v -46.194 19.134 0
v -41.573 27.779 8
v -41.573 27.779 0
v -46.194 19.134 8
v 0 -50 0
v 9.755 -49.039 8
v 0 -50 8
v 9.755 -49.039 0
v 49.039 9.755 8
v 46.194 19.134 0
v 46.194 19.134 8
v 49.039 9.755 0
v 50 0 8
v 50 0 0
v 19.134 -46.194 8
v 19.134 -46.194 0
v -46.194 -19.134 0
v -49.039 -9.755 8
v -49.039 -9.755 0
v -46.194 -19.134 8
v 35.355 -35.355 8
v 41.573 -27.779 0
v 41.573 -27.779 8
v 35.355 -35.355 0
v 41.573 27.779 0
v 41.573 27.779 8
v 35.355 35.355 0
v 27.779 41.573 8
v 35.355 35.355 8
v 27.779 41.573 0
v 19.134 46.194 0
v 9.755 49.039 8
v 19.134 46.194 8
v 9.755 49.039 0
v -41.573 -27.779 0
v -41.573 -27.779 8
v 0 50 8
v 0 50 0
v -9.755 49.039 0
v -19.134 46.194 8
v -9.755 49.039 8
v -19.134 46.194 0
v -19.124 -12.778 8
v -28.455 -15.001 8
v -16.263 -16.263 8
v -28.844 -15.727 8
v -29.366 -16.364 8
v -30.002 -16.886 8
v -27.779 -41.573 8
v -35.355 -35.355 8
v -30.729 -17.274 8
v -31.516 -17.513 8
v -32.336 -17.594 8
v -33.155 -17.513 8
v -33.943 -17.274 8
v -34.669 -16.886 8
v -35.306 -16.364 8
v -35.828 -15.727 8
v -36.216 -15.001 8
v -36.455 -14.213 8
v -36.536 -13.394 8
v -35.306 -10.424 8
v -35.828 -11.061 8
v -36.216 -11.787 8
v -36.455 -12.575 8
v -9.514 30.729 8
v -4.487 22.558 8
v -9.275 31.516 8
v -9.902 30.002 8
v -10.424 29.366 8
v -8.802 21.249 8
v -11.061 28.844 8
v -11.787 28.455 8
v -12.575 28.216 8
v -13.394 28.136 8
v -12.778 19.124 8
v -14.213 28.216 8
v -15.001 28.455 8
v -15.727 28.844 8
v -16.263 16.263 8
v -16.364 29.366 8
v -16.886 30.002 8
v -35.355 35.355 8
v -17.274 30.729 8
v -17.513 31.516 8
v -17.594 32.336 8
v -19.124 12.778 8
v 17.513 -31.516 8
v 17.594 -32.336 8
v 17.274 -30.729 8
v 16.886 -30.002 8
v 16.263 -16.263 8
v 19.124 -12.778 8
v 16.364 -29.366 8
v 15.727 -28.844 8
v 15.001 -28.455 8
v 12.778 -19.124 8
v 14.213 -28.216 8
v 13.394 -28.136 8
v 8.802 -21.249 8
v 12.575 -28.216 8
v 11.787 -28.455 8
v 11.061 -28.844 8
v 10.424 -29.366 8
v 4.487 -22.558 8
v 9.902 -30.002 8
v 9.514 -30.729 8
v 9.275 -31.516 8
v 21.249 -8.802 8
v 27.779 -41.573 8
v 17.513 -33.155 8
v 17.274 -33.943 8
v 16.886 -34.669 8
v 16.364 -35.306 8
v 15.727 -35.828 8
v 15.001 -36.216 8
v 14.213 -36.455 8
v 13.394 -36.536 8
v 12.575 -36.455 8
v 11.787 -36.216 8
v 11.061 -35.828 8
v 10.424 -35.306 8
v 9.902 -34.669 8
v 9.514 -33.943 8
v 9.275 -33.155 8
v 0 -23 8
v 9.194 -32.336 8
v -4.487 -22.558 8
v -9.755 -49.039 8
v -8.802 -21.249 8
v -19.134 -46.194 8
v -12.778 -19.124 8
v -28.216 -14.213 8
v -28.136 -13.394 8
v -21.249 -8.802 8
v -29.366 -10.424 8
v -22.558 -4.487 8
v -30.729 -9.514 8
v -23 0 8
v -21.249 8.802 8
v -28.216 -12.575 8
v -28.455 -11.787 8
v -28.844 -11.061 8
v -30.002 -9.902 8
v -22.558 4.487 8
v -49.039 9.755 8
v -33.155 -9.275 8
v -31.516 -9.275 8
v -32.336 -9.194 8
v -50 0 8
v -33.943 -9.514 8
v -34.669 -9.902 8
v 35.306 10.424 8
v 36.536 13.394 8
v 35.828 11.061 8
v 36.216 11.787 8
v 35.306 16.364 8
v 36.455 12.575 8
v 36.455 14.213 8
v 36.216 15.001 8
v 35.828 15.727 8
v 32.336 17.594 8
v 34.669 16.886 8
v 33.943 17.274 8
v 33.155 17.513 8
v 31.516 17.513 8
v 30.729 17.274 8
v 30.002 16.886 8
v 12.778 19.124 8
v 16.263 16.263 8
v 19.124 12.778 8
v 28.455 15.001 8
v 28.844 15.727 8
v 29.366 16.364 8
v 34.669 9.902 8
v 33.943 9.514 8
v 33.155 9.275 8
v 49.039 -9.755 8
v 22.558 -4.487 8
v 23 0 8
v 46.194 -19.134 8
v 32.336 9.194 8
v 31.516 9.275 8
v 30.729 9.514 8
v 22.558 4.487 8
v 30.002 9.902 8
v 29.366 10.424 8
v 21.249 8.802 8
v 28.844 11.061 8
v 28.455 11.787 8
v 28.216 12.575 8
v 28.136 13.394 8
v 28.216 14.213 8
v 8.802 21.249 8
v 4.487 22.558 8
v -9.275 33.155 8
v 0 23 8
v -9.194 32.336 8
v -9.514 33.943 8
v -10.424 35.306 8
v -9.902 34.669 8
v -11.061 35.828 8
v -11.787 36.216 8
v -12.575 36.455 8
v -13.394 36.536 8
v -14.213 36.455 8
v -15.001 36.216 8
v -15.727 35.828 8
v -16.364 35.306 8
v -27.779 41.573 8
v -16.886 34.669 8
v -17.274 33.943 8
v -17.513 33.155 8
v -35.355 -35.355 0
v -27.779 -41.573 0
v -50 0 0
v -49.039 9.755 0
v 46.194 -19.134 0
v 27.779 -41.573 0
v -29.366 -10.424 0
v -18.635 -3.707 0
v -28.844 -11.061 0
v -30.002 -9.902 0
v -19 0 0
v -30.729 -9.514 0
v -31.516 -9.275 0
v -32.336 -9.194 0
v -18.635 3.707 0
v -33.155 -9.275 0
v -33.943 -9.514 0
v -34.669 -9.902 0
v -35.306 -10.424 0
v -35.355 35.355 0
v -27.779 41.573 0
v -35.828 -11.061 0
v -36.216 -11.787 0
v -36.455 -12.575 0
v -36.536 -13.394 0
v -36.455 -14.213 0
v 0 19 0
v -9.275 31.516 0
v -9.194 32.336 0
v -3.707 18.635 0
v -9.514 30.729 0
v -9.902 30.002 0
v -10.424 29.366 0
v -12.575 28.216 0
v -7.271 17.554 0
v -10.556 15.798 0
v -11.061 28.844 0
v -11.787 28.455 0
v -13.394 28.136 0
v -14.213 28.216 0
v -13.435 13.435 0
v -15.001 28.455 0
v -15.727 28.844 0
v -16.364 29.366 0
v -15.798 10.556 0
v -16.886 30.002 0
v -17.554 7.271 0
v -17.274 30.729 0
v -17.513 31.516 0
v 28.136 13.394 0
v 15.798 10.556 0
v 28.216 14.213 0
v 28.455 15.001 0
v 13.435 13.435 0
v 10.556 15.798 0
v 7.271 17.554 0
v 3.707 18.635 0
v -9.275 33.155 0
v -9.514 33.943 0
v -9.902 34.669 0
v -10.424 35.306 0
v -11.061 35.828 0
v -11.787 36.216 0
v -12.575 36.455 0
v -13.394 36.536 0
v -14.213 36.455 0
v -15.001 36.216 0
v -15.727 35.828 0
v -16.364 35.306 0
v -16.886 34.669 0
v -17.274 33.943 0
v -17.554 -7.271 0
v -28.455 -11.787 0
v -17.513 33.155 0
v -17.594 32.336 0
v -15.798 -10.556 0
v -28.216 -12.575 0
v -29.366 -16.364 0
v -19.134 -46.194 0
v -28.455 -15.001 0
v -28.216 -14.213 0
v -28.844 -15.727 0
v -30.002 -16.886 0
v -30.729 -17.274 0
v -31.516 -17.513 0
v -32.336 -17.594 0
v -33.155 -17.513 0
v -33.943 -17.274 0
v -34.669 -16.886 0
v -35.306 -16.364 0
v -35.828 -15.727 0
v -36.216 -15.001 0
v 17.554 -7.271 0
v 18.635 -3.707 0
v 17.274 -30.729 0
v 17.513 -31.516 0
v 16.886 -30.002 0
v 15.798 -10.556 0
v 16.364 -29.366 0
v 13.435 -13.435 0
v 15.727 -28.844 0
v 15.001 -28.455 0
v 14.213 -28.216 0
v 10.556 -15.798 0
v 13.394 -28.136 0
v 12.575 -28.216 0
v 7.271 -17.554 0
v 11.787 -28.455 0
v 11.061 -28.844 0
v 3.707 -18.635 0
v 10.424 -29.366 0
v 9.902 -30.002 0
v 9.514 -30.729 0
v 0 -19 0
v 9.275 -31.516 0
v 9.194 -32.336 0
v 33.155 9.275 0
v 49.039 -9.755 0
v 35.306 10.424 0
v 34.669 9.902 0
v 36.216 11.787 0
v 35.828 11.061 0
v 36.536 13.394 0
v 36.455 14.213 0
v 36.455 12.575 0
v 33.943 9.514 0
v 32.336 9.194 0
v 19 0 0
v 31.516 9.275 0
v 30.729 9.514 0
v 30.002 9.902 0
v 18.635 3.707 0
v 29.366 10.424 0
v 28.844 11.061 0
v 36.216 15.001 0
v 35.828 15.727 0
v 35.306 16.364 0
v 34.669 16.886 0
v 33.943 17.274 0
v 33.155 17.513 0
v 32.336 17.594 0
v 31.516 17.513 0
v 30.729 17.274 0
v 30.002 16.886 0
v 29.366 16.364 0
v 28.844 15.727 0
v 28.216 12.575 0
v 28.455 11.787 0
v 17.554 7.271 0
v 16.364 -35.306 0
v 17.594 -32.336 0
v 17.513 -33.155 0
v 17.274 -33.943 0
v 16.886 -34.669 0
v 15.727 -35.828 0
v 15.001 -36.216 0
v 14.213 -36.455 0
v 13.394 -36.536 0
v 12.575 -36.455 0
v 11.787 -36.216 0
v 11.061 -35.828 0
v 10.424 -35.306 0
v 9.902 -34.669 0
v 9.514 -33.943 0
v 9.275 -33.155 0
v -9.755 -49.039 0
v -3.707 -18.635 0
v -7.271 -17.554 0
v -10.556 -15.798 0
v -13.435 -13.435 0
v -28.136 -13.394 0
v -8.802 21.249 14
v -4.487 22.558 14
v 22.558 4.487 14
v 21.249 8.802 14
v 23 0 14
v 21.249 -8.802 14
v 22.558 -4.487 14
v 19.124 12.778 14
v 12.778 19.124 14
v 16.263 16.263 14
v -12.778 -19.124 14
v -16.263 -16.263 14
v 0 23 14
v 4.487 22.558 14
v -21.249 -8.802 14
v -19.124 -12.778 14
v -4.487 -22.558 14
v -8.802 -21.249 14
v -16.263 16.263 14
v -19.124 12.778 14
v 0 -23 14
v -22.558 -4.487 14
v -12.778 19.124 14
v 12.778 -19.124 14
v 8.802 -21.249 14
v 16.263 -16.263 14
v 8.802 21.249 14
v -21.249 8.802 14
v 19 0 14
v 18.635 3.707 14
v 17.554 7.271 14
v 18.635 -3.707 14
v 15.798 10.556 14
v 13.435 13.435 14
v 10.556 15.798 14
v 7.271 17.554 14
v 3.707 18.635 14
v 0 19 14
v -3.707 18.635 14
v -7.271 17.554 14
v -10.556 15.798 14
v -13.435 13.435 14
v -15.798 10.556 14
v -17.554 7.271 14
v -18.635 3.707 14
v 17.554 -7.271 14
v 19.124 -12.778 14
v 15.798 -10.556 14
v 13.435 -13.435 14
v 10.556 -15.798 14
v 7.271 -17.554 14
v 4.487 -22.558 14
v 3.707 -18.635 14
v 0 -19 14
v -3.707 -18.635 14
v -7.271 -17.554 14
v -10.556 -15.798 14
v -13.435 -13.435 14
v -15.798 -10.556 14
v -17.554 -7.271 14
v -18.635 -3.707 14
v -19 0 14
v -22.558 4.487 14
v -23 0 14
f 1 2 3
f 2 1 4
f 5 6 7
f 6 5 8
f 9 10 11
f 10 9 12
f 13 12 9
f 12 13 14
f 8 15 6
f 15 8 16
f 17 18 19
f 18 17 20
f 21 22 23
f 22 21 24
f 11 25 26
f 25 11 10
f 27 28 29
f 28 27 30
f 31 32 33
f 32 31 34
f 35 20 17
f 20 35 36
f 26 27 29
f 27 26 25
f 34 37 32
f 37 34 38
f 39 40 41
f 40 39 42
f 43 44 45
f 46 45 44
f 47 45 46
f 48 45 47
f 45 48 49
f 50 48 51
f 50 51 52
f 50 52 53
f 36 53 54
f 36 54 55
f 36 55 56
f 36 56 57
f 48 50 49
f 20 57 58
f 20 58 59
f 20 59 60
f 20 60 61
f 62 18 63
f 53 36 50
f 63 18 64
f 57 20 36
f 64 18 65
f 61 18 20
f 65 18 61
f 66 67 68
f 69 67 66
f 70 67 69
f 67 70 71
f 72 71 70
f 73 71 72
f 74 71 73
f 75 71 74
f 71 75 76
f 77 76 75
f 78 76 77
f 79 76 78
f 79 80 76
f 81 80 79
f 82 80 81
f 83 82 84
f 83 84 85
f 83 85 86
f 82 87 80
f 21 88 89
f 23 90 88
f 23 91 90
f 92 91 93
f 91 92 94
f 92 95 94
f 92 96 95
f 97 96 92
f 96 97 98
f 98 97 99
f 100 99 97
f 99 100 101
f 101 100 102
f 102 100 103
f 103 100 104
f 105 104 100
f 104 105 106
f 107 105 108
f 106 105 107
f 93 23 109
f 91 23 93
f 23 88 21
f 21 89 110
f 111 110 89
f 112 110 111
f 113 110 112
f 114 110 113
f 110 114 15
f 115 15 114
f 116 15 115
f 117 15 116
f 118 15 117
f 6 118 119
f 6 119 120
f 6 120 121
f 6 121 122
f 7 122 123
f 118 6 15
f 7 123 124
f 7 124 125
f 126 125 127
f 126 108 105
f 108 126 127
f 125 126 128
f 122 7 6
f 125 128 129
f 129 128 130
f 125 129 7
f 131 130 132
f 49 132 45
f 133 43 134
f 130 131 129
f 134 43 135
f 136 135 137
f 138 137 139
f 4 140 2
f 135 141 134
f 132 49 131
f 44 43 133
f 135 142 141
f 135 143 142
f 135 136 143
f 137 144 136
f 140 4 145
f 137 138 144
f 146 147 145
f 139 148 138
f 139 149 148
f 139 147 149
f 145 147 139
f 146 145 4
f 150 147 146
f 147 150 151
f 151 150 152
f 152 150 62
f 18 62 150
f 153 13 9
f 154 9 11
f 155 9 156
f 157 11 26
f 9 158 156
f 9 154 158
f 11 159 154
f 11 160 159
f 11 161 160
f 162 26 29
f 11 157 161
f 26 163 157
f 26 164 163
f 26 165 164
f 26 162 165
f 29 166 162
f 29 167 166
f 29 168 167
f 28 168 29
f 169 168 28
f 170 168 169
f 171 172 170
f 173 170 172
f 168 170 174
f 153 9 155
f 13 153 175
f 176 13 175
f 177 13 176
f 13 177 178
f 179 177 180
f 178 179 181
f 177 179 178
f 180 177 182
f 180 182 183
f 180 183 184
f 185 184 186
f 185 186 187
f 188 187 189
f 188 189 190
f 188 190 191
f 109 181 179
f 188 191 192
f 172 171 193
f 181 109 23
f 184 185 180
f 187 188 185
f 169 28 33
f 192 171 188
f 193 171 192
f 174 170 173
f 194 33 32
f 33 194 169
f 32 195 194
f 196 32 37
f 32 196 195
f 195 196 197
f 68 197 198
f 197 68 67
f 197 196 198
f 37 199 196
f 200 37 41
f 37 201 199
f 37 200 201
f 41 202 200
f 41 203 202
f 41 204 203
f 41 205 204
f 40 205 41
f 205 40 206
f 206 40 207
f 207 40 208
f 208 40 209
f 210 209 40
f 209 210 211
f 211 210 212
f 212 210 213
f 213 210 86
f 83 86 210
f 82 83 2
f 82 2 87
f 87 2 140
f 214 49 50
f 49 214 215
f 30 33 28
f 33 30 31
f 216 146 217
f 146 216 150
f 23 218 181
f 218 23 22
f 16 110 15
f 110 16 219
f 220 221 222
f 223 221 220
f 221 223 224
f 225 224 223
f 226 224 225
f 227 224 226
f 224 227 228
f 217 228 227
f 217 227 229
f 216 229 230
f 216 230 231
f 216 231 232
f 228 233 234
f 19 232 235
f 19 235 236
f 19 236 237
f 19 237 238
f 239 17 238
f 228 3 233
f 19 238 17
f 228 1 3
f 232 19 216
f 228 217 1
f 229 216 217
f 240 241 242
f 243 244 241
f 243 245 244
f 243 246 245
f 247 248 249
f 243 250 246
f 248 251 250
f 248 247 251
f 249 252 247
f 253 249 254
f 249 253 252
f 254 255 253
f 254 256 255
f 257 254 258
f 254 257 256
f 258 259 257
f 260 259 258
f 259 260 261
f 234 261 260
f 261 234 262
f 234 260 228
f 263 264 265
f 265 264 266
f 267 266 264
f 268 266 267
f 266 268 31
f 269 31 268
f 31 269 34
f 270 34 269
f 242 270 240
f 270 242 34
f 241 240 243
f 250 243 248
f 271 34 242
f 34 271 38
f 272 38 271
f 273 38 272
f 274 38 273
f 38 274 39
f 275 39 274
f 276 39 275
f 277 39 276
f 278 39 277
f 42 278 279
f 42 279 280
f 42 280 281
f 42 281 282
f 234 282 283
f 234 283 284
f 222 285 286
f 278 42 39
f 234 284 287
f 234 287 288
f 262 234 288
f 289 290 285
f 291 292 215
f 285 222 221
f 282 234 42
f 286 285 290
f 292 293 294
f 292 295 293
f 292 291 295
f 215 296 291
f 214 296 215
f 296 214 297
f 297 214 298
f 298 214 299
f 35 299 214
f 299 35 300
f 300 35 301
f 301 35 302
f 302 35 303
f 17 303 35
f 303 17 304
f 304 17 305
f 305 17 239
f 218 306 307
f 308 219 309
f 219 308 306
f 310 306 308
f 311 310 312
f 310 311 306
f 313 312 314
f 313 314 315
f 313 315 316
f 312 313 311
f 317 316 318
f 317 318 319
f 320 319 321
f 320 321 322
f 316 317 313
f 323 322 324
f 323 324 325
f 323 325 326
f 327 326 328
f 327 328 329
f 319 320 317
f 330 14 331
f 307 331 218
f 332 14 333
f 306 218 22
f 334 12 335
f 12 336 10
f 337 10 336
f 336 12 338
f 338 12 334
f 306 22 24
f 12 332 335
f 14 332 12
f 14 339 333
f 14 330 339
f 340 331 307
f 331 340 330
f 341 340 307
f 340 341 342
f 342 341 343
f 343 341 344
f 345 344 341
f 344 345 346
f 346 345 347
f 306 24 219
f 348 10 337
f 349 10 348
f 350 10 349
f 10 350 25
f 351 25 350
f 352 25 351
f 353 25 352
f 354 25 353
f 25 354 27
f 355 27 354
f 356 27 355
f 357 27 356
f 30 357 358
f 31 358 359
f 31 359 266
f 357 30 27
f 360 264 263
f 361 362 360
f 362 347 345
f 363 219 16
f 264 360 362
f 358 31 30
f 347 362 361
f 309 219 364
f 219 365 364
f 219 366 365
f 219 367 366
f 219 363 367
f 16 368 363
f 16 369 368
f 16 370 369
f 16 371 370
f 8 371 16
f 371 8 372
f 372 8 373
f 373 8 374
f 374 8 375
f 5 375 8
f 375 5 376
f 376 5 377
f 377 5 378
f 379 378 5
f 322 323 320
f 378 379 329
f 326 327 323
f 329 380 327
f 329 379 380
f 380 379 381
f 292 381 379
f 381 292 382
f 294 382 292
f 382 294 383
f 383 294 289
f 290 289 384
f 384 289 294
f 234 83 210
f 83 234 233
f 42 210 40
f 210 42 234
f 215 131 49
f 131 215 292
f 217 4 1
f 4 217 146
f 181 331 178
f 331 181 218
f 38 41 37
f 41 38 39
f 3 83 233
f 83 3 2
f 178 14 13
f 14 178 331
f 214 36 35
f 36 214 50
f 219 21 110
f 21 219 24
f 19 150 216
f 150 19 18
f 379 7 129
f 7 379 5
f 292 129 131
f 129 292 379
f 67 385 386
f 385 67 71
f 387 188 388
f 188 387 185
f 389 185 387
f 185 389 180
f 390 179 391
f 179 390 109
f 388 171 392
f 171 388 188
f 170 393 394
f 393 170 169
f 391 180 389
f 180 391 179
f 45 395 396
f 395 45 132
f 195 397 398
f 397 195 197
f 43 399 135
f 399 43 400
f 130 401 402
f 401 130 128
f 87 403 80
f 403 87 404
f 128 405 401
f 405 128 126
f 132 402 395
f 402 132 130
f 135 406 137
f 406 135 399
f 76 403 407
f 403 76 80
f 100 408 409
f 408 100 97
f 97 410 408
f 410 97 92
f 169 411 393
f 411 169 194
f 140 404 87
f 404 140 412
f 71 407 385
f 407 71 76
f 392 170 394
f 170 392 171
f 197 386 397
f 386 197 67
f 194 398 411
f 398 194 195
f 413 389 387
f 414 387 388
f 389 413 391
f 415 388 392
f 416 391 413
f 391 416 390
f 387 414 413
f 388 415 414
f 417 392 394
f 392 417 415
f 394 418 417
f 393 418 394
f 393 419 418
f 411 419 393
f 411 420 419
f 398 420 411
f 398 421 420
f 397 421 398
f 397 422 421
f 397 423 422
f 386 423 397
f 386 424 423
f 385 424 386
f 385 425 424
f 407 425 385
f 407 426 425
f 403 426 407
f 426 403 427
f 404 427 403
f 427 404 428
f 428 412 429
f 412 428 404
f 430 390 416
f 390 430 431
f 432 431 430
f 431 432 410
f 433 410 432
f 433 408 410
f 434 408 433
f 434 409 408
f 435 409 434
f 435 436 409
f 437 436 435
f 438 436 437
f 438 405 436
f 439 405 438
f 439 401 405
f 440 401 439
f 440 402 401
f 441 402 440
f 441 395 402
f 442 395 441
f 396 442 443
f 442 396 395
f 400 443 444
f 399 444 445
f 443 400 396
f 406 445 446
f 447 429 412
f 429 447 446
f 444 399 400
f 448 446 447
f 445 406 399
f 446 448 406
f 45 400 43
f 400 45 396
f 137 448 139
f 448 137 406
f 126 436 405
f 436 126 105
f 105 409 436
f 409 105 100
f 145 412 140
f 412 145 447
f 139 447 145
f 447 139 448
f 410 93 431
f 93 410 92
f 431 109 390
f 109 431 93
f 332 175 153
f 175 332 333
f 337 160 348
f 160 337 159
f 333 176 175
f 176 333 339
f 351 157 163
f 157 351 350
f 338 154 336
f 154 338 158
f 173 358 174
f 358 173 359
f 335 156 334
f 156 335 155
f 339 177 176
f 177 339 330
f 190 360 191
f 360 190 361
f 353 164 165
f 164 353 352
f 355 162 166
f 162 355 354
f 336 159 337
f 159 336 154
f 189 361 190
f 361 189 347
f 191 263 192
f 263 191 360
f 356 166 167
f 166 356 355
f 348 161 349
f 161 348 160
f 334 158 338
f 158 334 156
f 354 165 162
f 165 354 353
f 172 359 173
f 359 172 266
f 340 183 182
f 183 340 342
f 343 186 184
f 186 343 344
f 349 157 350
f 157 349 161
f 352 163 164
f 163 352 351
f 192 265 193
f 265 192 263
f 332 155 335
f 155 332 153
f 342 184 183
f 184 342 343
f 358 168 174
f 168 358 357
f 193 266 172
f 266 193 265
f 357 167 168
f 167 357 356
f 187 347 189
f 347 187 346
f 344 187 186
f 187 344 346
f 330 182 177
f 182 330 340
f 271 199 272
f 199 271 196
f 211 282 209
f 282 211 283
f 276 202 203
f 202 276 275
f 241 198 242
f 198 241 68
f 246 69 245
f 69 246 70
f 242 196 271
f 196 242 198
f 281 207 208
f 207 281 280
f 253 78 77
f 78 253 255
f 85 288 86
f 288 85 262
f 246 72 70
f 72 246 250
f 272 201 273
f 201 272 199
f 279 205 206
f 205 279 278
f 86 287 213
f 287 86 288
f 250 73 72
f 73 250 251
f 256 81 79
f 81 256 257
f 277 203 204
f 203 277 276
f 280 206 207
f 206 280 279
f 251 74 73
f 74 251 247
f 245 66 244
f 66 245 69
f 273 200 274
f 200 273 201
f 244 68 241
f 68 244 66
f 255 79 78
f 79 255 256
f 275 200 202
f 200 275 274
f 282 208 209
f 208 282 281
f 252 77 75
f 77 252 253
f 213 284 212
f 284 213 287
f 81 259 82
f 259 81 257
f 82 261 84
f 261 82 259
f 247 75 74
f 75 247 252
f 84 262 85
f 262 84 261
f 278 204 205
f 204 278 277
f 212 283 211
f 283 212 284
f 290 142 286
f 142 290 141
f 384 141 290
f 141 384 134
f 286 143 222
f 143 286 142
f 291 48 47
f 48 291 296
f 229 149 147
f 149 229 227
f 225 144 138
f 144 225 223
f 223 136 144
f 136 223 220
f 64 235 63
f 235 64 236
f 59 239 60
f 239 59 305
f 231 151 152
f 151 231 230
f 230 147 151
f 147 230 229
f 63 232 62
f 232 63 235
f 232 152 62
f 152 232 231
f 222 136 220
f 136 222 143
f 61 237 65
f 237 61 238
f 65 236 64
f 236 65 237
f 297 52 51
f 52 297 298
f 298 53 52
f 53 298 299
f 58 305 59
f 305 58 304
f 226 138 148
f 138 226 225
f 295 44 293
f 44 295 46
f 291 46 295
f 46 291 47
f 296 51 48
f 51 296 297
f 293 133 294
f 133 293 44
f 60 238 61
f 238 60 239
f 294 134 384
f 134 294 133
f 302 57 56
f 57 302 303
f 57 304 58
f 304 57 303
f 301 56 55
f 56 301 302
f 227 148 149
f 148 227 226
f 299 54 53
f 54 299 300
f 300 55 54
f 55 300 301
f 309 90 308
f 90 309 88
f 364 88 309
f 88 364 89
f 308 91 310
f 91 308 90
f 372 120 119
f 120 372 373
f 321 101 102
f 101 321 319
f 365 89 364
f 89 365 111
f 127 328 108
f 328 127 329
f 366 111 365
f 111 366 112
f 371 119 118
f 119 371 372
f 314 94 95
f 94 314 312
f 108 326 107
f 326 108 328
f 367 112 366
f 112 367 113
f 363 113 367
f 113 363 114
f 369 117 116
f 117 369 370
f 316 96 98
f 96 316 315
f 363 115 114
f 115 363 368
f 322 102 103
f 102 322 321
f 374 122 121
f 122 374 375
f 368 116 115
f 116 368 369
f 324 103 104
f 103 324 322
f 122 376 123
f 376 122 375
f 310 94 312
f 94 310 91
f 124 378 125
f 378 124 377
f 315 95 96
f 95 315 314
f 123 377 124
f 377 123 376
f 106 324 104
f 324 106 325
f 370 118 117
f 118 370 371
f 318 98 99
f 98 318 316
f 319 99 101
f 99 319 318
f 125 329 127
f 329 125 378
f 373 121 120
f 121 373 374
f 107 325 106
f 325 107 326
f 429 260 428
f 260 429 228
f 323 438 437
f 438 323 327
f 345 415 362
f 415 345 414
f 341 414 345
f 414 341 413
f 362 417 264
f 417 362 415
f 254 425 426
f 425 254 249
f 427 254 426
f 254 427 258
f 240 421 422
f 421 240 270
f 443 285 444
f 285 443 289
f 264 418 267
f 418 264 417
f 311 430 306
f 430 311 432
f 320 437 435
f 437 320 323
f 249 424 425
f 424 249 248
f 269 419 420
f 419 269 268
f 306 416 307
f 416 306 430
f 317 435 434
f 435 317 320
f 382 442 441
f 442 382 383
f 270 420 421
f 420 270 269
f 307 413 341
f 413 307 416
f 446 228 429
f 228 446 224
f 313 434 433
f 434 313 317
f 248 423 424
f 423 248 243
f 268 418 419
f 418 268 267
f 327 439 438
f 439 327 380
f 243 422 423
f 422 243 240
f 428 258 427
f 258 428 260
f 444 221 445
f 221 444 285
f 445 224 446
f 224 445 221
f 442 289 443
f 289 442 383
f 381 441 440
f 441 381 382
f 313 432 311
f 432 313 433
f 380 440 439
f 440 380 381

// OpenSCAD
$fn = 32;

// ----------------------------------------------------------------------
// Flange Ø100 x 8
// 4 holes on a Ø70 bolt circle, bolted joints
// ----------------------------------------------------------------------

// --- parameters (mm) ---
flange_d = 100;    // outside diameter of the flange
thickness = 8;     // flange thickness
holes = 4;         // number of bolt holes
pcd = 70;          // bolt circle diameter
start_deg = 22.5;  // angle of the first hole, from +X
hole_d = 8.4;      // bolt hole diameter
bore_d = 38;       // central through bore
hub_d = 46;        // hub outside diameter
hub_h = 6;         // hub height above the flange face (0 = no hub)

// --- derived feature positions (mm) ---
height = thickness + hub_h;  // = 14   overall height of the part
pcd_r = pcd / 2;             // = 35   bolt circle radius
hole_step = 360 / holes;     // = 90   angular pitch
feature_centers = [
  [pcd_r * cos(start_deg + 0 * hole_step), pcd_r * sin(start_deg + 0 * hole_step)],
  [pcd_r * cos(start_deg + 1 * hole_step), pcd_r * sin(start_deg + 1 * hole_step)],
  [pcd_r * cos(start_deg + 2 * hole_step), pcd_r * sin(start_deg + 2 * hole_step)],
  [pcd_r * cos(start_deg + 3 * hole_step), pcd_r * sin(start_deg + 3 * hole_step)]
];   // bolt hole centres on the pitch circle

// flange disc, every hole and the bore cut straight through
difference() {
  union() {
    cylinder(d = flange_d, h = thickness);
    cylinder(d = hub_d, h = height);  // hub, overlapped into the flange
  }
  translate([0, 0, -1]) cylinder(d = bore_d, h = height + 2);  // bore, through
  for (centre = feature_centers)
    translate([centre[0], centre[1], -1]) cylinder(d = hole_d, h = thickness + 2);
}
